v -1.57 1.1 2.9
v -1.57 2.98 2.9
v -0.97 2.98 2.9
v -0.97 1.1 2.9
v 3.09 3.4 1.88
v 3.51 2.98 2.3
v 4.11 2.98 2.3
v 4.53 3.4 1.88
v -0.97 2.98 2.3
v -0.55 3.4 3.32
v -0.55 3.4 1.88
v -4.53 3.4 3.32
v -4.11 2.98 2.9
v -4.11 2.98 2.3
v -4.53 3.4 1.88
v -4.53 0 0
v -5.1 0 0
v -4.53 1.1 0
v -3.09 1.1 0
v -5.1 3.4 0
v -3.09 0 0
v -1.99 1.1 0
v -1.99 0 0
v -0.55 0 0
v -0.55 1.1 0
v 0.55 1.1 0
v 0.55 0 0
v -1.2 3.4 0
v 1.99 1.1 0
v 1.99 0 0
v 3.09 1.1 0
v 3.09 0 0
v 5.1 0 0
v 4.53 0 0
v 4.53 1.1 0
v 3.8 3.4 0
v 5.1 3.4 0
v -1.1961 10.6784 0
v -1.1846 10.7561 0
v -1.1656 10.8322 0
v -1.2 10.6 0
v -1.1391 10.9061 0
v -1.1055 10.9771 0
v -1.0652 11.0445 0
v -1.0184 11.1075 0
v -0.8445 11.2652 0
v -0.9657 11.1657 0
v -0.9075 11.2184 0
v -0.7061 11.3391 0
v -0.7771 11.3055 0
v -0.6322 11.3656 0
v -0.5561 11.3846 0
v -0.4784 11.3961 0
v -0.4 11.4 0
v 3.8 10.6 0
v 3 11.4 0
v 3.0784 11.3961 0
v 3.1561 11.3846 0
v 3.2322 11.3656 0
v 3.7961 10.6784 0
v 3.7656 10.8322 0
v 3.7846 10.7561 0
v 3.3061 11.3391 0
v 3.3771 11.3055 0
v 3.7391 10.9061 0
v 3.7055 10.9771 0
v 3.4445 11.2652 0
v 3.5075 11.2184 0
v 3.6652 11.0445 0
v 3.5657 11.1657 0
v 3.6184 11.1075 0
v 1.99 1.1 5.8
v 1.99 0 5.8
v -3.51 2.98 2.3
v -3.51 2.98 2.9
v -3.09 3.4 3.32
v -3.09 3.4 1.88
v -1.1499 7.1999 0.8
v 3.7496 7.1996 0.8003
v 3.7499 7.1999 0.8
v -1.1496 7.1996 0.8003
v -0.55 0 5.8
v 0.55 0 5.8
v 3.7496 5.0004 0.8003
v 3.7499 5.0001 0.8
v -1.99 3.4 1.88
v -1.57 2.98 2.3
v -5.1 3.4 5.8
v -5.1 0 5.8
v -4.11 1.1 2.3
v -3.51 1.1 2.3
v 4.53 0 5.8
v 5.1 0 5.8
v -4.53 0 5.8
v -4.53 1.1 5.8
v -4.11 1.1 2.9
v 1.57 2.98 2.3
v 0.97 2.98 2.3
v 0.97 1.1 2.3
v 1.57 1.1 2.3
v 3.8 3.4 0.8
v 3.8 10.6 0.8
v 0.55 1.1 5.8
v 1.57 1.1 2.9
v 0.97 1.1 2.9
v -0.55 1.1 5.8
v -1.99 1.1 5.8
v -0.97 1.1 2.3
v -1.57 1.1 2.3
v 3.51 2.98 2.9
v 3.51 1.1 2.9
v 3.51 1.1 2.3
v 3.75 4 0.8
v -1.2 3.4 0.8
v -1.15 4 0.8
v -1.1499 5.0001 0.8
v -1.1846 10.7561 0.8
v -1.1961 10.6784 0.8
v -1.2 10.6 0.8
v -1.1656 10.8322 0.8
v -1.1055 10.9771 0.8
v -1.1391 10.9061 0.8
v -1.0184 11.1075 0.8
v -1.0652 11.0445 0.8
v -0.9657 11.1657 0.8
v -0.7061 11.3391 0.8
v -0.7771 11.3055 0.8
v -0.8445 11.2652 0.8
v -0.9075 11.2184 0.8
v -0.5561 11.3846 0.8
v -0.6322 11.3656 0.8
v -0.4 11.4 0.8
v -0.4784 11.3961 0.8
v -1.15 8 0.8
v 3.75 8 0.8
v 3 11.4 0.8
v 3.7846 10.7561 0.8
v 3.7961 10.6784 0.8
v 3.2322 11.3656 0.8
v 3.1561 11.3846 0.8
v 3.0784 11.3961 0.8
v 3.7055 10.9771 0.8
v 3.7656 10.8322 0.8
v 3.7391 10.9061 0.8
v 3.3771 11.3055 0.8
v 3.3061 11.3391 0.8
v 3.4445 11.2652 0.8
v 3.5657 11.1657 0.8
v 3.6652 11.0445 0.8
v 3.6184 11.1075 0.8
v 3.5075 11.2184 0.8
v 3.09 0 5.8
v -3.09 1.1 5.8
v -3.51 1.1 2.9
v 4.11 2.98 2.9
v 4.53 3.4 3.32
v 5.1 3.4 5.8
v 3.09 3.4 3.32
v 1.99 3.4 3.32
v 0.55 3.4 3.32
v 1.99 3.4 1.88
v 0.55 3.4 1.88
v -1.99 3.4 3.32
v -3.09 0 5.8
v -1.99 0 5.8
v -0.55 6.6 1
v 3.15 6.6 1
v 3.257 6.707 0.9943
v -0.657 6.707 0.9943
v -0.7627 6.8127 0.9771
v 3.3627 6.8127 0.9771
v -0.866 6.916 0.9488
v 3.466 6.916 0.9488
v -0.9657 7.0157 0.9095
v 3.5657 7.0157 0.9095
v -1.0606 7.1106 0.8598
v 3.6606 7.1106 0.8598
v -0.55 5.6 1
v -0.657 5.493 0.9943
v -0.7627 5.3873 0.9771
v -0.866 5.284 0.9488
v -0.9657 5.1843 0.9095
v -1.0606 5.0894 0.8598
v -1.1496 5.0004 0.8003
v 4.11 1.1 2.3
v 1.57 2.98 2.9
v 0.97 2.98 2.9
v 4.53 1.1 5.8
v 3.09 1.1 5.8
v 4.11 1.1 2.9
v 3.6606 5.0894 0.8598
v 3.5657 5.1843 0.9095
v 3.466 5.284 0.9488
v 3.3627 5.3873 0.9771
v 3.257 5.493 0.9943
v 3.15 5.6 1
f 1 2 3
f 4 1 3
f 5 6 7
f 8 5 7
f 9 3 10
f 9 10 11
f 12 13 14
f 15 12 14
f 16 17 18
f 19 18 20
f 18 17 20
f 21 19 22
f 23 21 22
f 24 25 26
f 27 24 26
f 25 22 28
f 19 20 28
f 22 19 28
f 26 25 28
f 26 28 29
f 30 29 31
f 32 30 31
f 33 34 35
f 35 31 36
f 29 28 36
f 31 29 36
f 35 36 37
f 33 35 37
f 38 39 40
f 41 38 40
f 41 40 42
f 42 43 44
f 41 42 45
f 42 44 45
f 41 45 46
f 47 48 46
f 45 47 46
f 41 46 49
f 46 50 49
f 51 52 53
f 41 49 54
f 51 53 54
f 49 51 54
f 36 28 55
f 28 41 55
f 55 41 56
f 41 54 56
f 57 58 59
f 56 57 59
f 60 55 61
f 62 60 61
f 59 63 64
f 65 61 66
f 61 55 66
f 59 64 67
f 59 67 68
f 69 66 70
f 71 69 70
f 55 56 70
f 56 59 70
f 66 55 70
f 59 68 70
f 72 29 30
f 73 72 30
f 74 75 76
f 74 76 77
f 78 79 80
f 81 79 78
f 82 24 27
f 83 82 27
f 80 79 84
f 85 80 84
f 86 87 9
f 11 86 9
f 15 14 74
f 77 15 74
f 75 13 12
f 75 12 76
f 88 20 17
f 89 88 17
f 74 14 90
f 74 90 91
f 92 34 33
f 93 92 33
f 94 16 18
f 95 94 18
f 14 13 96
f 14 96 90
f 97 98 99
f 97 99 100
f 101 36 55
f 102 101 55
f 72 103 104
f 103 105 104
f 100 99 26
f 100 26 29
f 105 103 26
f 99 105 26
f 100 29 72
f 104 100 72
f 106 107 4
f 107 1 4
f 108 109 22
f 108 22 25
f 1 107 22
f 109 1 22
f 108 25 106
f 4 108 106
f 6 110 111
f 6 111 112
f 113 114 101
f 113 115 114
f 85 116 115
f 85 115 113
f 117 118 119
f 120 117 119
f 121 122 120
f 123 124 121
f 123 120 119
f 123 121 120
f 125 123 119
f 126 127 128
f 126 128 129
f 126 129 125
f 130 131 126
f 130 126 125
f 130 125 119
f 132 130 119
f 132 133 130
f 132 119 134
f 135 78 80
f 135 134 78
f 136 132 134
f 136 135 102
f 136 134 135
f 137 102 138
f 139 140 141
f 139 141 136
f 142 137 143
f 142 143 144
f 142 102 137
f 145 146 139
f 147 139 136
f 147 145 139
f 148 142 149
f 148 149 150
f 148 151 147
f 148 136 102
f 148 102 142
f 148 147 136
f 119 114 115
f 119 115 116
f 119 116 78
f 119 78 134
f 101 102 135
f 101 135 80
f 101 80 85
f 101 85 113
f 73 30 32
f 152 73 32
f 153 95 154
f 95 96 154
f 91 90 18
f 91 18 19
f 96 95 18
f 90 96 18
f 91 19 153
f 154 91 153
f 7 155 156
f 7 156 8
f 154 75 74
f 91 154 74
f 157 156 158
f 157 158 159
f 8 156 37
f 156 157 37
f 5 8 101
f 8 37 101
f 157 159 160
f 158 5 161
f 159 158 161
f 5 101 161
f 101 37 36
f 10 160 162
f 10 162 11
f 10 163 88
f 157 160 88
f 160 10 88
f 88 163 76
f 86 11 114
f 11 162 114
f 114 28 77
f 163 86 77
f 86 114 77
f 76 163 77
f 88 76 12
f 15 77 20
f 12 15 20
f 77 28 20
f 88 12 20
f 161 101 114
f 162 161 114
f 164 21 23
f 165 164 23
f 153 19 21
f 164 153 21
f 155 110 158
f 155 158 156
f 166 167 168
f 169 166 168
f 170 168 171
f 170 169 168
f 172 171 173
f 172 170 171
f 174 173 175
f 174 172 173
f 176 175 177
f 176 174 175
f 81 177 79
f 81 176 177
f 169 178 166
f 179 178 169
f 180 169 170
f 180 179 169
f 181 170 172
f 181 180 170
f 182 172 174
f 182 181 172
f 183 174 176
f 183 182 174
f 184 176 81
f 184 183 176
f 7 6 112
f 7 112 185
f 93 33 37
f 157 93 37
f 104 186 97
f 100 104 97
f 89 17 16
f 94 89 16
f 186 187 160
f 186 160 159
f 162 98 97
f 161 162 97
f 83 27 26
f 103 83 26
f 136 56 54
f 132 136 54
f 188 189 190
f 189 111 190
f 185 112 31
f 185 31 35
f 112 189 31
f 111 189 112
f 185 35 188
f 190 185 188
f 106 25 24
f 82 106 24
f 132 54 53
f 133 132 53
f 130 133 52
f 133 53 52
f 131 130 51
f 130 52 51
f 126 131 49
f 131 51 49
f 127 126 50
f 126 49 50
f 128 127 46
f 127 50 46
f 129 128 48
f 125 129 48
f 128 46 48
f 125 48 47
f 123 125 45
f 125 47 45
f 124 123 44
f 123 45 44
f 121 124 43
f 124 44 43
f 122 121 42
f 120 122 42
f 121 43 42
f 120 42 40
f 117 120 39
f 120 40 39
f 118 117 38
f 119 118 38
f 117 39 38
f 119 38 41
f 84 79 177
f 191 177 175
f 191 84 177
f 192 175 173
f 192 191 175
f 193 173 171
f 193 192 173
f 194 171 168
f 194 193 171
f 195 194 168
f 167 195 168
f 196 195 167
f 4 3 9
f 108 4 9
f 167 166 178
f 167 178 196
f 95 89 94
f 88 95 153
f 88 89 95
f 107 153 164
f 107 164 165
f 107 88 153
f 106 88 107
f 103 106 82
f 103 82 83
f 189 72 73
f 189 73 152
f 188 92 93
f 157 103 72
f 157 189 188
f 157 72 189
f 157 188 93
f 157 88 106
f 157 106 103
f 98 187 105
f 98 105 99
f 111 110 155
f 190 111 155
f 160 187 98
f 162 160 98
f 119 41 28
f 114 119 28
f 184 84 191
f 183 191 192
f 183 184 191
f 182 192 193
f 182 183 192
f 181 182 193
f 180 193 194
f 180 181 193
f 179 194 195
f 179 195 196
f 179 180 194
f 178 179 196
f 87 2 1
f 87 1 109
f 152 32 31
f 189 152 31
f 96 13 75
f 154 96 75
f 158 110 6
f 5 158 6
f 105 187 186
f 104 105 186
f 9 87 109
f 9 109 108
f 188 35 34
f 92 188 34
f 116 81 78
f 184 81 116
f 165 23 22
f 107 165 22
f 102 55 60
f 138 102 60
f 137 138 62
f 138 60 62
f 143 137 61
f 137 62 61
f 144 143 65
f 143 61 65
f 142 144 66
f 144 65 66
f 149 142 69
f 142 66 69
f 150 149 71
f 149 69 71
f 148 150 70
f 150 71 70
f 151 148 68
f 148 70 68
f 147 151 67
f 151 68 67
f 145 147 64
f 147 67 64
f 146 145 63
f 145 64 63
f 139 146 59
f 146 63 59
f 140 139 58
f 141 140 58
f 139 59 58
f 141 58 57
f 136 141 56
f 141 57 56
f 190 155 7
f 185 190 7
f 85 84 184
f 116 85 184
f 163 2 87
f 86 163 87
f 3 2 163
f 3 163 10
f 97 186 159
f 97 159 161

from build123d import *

# Parameters (mm, degrees)
AUFSATZ_LINEAR_AUSTRAGEN1_DEPTH = 5.8
SKIZZE1_3_W                     = 4.5
SKIZZE1_3_H                     = 1.8
AUFSATZ_LINEAR_AUSTRAGEN2_DEPTH = 0.8
SKIZZE1_4_W                     = 4.5
SKIZZE1_4_H                     = 1.8
AUFSATZ_LINEAR_AUSTRAGEN3_DEPTH = 1
FASE1_SIZE                      = 0.2
VERRUNDUNG1_START               = -2
VERRUNDUNG1_DEPTH               = 7
VERRUNDUNG1_START_2             = 4
VERRUNDUNG1_2_DEPTH             = 4
SKIZZE3_W                       = 0.6
SKIZZE3_H                       = 0.6
SCHNITT_LINEAR_AUSTRAGEN1_DEPTH = 12.119802157
FASE2_SIZE                      = 0.42


with BuildPart() as part:
    # Skizze1 → Aufsatz-Linear austragen1 (new body)
    with BuildSketch(Plane.XY):
        Polygon((-1.99, 1.1), (-0.55, 1.1), (-0.55, 0), (0.55, 0), (0.55, 1.1), (1.99, 1.1), (1.99, 0), (3.09, 0), (3.09, 1.1), (4.53, 1.1), (4.53, 0), (5.1, 0), (5.1, 3.4), (3.8, 3.4), (-1.2, 3.4), (-5.1, 3.4), (-5.1, 0), (-4.53, 0), (-4.53, 1.1), (-3.09, 1.1), (-3.09, 0), (-1.99, 0), align=None)
    extrude(amount=AUFSATZ_LINEAR_AUSTRAGEN1_DEPTH)

    # Skizze1<3> → Aufsatz-Linear austragen2 (add)
    # profile 1 of 2: a face of its own
    with BuildSketch(Plane.XY):
        with BuildLine():
            Line((-1.2, 10.6), (-1.2, 3.4))
            Line((-1.2, 3.4), (3.8, 3.4))
            Line((3.8, 3.4), (3.8, 10.6))
            ThreePointArc((3.8, 10.6), (3.565685425, 11.165685425), (3, 11.4))
            Line((3, 11.4), (-0.4, 11.4))
            ThreePointArc((-0.4, 11.4), (-0.965685425, 11.165685425), (-1.2, 10.6))
        make_face()
        with Locations((1.3, 6.1)):
            Rectangle(SKIZZE1_3_W, SKIZZE1_3_H, mode=Mode.SUBTRACT)
    # profile 2 of 2: a face of its own
    with BuildSketch(Plane.XY):
        with Locations((1.3, 6.1)):
            Rectangle(SKIZZE1_3_W, SKIZZE1_3_H)
    extrude(amount=AUFSATZ_LINEAR_AUSTRAGEN2_DEPTH)

    # Skizze1<4> → Aufsatz-Linear austragen3 (add)
    with BuildSketch(Plane.XY):
        with Locations((1.3, 6.1)):
            Rectangle(SKIZZE1_4_W, SKIZZE1_4_H)
    extrude(amount=AUFSATZ_LINEAR_AUSTRAGEN3_DEPTH)

    # Fase1
    fase1_edges = [part.edges().sort_by_distance(p)[0] for p in [
        (-0.95, 6.1, 0.8),
        (1.3, 5.2, 0.8),
        (3.55, 6.1, 0.8),
        (1.3, 7, 0.8),
    ]]
    chamfer(fase1_edges, length=FASE1_SIZE - 0.0001)  # a hair under: the kernel refuses the full size

    # Verrundung1: read off the stored shape, not the designer's step
    # Verrundung1 outline → Verrundung1 (cut)
    with BuildSketch(Plane.YZ.offset(VERRUNDUNG1_START)):
        with BuildLine():
            ThreePointArc((5, 0.8), (5.283772234, 0.948683298), (5.6, 1))
            Line((5.6, 1), (5.2, 1))
            Line((5.2, 1), (5, 0.8))
        make_face()
        with BuildLine():
            ThreePointArc((6.6, 1), (6.916227766, 0.948683298), (7.2, 0.8))
            Line((7.2, 0.8), (7, 1))
            Line((7, 1), (6.6, 1))
        make_face()
    extrude(amount=VERRUNDUNG1_DEPTH, mode=Mode.SUBTRACT)

    # Verrundung1 2 outline → Verrundung1 2 (cut)
    with BuildSketch(Plane(origin=(0, 0, 0), x_dir=(1, 0, 0), z_dir=(0, 1, 0)).offset(VERRUNDUNG1_START_2)):
        with BuildLine():
            Line((-0.95, -1), (-0.55, -1))
            ThreePointArc((-0.55, -1), (-0.866227766, -0.948683298), (-1.15, -0.8))
            Line((-1.15, -0.8), (-0.95, -1))
        make_face()
        with BuildLine():
            ThreePointArc((3.75, -0.8), (3.466227766, -0.948683298), (3.15, -1))
            Line((3.15, -1), (3.55, -1))
            Line((3.55, -1), (3.75, -0.8))
        make_face()
    extrude(amount=VERRUNDUNG1_2_DEPTH, mode=Mode.SUBTRACT)

    # Skizze3 → Schnitt-Linear austragen1 (cut, through all)
    with BuildSketch(Plane(origin=(0, 3.4, 0), x_dir=(1, 0, 0), z_dir=(0, 1, 0))):
        with Locations((1.27, -2.6)):
            Rectangle(SKIZZE3_W, SKIZZE3_H)
        with Locations((-1.27, -2.6)):
            Rectangle(SKIZZE3_W, SKIZZE3_H)
        with Locations((-3.81, -2.6)):
            Rectangle(SKIZZE3_W, SKIZZE3_H)
        with Locations((3.81, -2.6)):
            Rectangle(SKIZZE3_W, SKIZZE3_H)
    extrude(amount=-SCHNITT_LINEAR_AUSTRAGEN1_DEPTH, mode=Mode.SUBTRACT)

    # Fase2
    fase2_edges = [part.edges().sort_by_distance(p)[0] for p in [
        (3.81, 3.4, 2.3),
        (3.51, 3.4, 2.6),
        (3.81, 3.4, 2.9),
        (4.11, 3.4, 2.6),
        (1.27, 3.4, 2.3),
        (0.97, 3.4, 2.6),
        (1.27, 3.4, 2.9),
        (1.57, 3.4, 2.6),
        (-3.51, 3.4, 2.6),
        (-3.81, 3.4, 2.3),
        (-4.11, 3.4, 2.6),
        (-3.81, 3.4, 2.9),
        (-0.97, 3.4, 2.6),
        (-1.27, 3.4, 2.3),
        (-1.57, 3.4, 2.6),
        (-1.27, 3.4, 2.9),
    ]]
    chamfer(fase2_edges, length=FASE2_SIZE)


solid = part.part
